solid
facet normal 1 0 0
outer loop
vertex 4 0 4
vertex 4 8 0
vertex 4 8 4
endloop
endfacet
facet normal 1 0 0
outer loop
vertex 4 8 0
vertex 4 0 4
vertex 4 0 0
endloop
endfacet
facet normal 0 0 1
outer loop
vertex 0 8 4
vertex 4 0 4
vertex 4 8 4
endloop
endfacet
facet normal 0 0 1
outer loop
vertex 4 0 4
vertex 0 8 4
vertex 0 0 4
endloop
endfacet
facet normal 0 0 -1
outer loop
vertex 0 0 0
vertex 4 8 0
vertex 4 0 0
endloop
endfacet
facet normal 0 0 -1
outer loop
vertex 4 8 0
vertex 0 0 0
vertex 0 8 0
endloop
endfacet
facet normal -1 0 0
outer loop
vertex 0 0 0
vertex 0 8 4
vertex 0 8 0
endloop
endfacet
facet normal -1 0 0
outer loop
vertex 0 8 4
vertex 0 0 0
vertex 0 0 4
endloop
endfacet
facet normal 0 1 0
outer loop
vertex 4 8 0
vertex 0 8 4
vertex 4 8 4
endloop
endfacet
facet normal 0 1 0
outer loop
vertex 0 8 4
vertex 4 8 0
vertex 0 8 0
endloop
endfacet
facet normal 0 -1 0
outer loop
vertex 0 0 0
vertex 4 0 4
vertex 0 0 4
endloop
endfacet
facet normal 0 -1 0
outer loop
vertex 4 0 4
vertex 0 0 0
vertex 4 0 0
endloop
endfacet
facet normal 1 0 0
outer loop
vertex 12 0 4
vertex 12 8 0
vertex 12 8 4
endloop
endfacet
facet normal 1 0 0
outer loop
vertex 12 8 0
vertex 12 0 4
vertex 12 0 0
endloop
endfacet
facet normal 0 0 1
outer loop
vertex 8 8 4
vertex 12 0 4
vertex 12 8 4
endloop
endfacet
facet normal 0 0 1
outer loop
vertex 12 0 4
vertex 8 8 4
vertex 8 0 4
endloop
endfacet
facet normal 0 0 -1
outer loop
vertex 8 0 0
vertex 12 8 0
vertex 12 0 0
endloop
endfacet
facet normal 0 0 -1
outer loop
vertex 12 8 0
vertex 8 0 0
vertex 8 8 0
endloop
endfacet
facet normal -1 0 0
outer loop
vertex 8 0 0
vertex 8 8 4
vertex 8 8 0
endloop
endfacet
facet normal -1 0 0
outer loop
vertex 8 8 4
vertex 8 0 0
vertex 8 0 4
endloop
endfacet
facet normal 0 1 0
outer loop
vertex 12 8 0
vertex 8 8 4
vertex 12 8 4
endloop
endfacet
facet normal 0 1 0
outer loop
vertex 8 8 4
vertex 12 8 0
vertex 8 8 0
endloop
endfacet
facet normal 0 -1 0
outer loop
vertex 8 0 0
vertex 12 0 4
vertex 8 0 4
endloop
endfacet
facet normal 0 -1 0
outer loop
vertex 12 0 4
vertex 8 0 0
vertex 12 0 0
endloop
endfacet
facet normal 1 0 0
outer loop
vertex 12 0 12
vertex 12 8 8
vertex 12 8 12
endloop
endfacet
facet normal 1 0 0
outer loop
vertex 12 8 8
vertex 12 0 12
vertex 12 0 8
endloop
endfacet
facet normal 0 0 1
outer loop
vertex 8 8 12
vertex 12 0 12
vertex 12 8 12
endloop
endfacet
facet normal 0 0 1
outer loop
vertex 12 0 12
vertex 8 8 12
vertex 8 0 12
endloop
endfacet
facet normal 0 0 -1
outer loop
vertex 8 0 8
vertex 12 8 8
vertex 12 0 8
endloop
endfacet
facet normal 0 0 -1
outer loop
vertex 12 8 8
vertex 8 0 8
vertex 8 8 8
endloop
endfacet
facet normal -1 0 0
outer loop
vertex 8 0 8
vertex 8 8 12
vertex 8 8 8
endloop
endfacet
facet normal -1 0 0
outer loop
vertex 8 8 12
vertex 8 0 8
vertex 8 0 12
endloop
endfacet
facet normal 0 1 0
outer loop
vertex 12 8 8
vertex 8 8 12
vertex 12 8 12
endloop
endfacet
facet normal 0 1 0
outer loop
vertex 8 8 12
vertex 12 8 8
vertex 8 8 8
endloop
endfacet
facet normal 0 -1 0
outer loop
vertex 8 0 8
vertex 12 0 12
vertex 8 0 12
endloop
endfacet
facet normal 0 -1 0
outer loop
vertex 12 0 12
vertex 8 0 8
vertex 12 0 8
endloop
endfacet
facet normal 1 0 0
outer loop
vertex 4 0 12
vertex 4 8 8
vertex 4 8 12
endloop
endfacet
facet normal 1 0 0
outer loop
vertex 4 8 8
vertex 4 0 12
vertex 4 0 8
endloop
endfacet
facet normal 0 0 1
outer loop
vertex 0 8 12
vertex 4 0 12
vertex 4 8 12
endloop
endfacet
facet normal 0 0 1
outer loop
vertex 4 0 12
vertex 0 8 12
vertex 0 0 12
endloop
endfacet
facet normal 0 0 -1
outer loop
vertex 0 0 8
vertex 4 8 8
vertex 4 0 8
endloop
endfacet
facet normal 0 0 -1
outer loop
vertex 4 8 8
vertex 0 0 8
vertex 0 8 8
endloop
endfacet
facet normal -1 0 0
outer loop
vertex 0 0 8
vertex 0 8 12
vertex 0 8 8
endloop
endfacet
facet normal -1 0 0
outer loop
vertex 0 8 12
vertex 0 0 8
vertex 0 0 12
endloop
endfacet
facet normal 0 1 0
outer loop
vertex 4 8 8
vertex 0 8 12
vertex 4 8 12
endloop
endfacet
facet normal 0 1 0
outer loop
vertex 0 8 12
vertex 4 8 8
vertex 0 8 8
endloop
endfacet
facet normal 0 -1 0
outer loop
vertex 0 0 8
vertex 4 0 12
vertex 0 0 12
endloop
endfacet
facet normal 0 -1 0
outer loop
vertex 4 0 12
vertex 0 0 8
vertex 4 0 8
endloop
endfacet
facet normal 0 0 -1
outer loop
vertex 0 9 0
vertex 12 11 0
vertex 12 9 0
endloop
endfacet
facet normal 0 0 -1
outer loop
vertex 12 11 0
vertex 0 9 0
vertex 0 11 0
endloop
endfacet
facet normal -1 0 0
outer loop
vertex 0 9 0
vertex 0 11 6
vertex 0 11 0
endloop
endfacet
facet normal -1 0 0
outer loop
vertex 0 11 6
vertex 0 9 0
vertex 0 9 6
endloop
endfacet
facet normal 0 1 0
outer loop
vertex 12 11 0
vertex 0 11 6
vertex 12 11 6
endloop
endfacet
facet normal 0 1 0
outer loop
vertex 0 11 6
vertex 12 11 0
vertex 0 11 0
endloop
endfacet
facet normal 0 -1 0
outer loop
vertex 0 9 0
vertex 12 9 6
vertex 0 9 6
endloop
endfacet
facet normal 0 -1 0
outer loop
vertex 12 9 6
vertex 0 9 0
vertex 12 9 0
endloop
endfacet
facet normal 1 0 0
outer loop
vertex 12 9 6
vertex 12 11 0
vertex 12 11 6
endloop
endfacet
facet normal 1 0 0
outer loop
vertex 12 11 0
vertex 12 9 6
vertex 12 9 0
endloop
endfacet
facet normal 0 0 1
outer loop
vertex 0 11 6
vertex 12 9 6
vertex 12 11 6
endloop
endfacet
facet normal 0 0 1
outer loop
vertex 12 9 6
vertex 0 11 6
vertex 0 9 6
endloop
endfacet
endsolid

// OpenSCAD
cube([4,8,4]);
translate([8,0,0])
cube([4,8,4]);
translate([8,0,8])
cube([4,8,4]);
translate([0,0,8])
cube([4,8,4]);
translate([0,9,0])
cube(2,2,2);
translate([2,9,0])
cube(2,2,2);
translate([4,9,0])
cube(2,2,2);
translate([6,9,0])
cube(2,2,2);
translate([8,9,0])
cube(2,2,2);
translate([10,9,0])
cube(2,2,2);
translate([10,9,2])
cube(2,2,2);
translate([8,9,2])
cube(2,2,2);
translate([6,9,2])
cube(2,2,2);
translate([4,9,2])
cube(2,2,2);
translate([2,9,2])
cube(2,2,2);
translate([0,9,2])
cube(2,2,2);
translate([0,9,4])
cube(2,2,4);
translate([2,9,4])
cube(2,2,4);
translate([4,9,4])
cube(2,2,4);
translate([6,9,4])
cube(2,2,4);
translate([8,9,4])
cube(2,2,4);
translate([10,9,4])
cube(2,2,4);
